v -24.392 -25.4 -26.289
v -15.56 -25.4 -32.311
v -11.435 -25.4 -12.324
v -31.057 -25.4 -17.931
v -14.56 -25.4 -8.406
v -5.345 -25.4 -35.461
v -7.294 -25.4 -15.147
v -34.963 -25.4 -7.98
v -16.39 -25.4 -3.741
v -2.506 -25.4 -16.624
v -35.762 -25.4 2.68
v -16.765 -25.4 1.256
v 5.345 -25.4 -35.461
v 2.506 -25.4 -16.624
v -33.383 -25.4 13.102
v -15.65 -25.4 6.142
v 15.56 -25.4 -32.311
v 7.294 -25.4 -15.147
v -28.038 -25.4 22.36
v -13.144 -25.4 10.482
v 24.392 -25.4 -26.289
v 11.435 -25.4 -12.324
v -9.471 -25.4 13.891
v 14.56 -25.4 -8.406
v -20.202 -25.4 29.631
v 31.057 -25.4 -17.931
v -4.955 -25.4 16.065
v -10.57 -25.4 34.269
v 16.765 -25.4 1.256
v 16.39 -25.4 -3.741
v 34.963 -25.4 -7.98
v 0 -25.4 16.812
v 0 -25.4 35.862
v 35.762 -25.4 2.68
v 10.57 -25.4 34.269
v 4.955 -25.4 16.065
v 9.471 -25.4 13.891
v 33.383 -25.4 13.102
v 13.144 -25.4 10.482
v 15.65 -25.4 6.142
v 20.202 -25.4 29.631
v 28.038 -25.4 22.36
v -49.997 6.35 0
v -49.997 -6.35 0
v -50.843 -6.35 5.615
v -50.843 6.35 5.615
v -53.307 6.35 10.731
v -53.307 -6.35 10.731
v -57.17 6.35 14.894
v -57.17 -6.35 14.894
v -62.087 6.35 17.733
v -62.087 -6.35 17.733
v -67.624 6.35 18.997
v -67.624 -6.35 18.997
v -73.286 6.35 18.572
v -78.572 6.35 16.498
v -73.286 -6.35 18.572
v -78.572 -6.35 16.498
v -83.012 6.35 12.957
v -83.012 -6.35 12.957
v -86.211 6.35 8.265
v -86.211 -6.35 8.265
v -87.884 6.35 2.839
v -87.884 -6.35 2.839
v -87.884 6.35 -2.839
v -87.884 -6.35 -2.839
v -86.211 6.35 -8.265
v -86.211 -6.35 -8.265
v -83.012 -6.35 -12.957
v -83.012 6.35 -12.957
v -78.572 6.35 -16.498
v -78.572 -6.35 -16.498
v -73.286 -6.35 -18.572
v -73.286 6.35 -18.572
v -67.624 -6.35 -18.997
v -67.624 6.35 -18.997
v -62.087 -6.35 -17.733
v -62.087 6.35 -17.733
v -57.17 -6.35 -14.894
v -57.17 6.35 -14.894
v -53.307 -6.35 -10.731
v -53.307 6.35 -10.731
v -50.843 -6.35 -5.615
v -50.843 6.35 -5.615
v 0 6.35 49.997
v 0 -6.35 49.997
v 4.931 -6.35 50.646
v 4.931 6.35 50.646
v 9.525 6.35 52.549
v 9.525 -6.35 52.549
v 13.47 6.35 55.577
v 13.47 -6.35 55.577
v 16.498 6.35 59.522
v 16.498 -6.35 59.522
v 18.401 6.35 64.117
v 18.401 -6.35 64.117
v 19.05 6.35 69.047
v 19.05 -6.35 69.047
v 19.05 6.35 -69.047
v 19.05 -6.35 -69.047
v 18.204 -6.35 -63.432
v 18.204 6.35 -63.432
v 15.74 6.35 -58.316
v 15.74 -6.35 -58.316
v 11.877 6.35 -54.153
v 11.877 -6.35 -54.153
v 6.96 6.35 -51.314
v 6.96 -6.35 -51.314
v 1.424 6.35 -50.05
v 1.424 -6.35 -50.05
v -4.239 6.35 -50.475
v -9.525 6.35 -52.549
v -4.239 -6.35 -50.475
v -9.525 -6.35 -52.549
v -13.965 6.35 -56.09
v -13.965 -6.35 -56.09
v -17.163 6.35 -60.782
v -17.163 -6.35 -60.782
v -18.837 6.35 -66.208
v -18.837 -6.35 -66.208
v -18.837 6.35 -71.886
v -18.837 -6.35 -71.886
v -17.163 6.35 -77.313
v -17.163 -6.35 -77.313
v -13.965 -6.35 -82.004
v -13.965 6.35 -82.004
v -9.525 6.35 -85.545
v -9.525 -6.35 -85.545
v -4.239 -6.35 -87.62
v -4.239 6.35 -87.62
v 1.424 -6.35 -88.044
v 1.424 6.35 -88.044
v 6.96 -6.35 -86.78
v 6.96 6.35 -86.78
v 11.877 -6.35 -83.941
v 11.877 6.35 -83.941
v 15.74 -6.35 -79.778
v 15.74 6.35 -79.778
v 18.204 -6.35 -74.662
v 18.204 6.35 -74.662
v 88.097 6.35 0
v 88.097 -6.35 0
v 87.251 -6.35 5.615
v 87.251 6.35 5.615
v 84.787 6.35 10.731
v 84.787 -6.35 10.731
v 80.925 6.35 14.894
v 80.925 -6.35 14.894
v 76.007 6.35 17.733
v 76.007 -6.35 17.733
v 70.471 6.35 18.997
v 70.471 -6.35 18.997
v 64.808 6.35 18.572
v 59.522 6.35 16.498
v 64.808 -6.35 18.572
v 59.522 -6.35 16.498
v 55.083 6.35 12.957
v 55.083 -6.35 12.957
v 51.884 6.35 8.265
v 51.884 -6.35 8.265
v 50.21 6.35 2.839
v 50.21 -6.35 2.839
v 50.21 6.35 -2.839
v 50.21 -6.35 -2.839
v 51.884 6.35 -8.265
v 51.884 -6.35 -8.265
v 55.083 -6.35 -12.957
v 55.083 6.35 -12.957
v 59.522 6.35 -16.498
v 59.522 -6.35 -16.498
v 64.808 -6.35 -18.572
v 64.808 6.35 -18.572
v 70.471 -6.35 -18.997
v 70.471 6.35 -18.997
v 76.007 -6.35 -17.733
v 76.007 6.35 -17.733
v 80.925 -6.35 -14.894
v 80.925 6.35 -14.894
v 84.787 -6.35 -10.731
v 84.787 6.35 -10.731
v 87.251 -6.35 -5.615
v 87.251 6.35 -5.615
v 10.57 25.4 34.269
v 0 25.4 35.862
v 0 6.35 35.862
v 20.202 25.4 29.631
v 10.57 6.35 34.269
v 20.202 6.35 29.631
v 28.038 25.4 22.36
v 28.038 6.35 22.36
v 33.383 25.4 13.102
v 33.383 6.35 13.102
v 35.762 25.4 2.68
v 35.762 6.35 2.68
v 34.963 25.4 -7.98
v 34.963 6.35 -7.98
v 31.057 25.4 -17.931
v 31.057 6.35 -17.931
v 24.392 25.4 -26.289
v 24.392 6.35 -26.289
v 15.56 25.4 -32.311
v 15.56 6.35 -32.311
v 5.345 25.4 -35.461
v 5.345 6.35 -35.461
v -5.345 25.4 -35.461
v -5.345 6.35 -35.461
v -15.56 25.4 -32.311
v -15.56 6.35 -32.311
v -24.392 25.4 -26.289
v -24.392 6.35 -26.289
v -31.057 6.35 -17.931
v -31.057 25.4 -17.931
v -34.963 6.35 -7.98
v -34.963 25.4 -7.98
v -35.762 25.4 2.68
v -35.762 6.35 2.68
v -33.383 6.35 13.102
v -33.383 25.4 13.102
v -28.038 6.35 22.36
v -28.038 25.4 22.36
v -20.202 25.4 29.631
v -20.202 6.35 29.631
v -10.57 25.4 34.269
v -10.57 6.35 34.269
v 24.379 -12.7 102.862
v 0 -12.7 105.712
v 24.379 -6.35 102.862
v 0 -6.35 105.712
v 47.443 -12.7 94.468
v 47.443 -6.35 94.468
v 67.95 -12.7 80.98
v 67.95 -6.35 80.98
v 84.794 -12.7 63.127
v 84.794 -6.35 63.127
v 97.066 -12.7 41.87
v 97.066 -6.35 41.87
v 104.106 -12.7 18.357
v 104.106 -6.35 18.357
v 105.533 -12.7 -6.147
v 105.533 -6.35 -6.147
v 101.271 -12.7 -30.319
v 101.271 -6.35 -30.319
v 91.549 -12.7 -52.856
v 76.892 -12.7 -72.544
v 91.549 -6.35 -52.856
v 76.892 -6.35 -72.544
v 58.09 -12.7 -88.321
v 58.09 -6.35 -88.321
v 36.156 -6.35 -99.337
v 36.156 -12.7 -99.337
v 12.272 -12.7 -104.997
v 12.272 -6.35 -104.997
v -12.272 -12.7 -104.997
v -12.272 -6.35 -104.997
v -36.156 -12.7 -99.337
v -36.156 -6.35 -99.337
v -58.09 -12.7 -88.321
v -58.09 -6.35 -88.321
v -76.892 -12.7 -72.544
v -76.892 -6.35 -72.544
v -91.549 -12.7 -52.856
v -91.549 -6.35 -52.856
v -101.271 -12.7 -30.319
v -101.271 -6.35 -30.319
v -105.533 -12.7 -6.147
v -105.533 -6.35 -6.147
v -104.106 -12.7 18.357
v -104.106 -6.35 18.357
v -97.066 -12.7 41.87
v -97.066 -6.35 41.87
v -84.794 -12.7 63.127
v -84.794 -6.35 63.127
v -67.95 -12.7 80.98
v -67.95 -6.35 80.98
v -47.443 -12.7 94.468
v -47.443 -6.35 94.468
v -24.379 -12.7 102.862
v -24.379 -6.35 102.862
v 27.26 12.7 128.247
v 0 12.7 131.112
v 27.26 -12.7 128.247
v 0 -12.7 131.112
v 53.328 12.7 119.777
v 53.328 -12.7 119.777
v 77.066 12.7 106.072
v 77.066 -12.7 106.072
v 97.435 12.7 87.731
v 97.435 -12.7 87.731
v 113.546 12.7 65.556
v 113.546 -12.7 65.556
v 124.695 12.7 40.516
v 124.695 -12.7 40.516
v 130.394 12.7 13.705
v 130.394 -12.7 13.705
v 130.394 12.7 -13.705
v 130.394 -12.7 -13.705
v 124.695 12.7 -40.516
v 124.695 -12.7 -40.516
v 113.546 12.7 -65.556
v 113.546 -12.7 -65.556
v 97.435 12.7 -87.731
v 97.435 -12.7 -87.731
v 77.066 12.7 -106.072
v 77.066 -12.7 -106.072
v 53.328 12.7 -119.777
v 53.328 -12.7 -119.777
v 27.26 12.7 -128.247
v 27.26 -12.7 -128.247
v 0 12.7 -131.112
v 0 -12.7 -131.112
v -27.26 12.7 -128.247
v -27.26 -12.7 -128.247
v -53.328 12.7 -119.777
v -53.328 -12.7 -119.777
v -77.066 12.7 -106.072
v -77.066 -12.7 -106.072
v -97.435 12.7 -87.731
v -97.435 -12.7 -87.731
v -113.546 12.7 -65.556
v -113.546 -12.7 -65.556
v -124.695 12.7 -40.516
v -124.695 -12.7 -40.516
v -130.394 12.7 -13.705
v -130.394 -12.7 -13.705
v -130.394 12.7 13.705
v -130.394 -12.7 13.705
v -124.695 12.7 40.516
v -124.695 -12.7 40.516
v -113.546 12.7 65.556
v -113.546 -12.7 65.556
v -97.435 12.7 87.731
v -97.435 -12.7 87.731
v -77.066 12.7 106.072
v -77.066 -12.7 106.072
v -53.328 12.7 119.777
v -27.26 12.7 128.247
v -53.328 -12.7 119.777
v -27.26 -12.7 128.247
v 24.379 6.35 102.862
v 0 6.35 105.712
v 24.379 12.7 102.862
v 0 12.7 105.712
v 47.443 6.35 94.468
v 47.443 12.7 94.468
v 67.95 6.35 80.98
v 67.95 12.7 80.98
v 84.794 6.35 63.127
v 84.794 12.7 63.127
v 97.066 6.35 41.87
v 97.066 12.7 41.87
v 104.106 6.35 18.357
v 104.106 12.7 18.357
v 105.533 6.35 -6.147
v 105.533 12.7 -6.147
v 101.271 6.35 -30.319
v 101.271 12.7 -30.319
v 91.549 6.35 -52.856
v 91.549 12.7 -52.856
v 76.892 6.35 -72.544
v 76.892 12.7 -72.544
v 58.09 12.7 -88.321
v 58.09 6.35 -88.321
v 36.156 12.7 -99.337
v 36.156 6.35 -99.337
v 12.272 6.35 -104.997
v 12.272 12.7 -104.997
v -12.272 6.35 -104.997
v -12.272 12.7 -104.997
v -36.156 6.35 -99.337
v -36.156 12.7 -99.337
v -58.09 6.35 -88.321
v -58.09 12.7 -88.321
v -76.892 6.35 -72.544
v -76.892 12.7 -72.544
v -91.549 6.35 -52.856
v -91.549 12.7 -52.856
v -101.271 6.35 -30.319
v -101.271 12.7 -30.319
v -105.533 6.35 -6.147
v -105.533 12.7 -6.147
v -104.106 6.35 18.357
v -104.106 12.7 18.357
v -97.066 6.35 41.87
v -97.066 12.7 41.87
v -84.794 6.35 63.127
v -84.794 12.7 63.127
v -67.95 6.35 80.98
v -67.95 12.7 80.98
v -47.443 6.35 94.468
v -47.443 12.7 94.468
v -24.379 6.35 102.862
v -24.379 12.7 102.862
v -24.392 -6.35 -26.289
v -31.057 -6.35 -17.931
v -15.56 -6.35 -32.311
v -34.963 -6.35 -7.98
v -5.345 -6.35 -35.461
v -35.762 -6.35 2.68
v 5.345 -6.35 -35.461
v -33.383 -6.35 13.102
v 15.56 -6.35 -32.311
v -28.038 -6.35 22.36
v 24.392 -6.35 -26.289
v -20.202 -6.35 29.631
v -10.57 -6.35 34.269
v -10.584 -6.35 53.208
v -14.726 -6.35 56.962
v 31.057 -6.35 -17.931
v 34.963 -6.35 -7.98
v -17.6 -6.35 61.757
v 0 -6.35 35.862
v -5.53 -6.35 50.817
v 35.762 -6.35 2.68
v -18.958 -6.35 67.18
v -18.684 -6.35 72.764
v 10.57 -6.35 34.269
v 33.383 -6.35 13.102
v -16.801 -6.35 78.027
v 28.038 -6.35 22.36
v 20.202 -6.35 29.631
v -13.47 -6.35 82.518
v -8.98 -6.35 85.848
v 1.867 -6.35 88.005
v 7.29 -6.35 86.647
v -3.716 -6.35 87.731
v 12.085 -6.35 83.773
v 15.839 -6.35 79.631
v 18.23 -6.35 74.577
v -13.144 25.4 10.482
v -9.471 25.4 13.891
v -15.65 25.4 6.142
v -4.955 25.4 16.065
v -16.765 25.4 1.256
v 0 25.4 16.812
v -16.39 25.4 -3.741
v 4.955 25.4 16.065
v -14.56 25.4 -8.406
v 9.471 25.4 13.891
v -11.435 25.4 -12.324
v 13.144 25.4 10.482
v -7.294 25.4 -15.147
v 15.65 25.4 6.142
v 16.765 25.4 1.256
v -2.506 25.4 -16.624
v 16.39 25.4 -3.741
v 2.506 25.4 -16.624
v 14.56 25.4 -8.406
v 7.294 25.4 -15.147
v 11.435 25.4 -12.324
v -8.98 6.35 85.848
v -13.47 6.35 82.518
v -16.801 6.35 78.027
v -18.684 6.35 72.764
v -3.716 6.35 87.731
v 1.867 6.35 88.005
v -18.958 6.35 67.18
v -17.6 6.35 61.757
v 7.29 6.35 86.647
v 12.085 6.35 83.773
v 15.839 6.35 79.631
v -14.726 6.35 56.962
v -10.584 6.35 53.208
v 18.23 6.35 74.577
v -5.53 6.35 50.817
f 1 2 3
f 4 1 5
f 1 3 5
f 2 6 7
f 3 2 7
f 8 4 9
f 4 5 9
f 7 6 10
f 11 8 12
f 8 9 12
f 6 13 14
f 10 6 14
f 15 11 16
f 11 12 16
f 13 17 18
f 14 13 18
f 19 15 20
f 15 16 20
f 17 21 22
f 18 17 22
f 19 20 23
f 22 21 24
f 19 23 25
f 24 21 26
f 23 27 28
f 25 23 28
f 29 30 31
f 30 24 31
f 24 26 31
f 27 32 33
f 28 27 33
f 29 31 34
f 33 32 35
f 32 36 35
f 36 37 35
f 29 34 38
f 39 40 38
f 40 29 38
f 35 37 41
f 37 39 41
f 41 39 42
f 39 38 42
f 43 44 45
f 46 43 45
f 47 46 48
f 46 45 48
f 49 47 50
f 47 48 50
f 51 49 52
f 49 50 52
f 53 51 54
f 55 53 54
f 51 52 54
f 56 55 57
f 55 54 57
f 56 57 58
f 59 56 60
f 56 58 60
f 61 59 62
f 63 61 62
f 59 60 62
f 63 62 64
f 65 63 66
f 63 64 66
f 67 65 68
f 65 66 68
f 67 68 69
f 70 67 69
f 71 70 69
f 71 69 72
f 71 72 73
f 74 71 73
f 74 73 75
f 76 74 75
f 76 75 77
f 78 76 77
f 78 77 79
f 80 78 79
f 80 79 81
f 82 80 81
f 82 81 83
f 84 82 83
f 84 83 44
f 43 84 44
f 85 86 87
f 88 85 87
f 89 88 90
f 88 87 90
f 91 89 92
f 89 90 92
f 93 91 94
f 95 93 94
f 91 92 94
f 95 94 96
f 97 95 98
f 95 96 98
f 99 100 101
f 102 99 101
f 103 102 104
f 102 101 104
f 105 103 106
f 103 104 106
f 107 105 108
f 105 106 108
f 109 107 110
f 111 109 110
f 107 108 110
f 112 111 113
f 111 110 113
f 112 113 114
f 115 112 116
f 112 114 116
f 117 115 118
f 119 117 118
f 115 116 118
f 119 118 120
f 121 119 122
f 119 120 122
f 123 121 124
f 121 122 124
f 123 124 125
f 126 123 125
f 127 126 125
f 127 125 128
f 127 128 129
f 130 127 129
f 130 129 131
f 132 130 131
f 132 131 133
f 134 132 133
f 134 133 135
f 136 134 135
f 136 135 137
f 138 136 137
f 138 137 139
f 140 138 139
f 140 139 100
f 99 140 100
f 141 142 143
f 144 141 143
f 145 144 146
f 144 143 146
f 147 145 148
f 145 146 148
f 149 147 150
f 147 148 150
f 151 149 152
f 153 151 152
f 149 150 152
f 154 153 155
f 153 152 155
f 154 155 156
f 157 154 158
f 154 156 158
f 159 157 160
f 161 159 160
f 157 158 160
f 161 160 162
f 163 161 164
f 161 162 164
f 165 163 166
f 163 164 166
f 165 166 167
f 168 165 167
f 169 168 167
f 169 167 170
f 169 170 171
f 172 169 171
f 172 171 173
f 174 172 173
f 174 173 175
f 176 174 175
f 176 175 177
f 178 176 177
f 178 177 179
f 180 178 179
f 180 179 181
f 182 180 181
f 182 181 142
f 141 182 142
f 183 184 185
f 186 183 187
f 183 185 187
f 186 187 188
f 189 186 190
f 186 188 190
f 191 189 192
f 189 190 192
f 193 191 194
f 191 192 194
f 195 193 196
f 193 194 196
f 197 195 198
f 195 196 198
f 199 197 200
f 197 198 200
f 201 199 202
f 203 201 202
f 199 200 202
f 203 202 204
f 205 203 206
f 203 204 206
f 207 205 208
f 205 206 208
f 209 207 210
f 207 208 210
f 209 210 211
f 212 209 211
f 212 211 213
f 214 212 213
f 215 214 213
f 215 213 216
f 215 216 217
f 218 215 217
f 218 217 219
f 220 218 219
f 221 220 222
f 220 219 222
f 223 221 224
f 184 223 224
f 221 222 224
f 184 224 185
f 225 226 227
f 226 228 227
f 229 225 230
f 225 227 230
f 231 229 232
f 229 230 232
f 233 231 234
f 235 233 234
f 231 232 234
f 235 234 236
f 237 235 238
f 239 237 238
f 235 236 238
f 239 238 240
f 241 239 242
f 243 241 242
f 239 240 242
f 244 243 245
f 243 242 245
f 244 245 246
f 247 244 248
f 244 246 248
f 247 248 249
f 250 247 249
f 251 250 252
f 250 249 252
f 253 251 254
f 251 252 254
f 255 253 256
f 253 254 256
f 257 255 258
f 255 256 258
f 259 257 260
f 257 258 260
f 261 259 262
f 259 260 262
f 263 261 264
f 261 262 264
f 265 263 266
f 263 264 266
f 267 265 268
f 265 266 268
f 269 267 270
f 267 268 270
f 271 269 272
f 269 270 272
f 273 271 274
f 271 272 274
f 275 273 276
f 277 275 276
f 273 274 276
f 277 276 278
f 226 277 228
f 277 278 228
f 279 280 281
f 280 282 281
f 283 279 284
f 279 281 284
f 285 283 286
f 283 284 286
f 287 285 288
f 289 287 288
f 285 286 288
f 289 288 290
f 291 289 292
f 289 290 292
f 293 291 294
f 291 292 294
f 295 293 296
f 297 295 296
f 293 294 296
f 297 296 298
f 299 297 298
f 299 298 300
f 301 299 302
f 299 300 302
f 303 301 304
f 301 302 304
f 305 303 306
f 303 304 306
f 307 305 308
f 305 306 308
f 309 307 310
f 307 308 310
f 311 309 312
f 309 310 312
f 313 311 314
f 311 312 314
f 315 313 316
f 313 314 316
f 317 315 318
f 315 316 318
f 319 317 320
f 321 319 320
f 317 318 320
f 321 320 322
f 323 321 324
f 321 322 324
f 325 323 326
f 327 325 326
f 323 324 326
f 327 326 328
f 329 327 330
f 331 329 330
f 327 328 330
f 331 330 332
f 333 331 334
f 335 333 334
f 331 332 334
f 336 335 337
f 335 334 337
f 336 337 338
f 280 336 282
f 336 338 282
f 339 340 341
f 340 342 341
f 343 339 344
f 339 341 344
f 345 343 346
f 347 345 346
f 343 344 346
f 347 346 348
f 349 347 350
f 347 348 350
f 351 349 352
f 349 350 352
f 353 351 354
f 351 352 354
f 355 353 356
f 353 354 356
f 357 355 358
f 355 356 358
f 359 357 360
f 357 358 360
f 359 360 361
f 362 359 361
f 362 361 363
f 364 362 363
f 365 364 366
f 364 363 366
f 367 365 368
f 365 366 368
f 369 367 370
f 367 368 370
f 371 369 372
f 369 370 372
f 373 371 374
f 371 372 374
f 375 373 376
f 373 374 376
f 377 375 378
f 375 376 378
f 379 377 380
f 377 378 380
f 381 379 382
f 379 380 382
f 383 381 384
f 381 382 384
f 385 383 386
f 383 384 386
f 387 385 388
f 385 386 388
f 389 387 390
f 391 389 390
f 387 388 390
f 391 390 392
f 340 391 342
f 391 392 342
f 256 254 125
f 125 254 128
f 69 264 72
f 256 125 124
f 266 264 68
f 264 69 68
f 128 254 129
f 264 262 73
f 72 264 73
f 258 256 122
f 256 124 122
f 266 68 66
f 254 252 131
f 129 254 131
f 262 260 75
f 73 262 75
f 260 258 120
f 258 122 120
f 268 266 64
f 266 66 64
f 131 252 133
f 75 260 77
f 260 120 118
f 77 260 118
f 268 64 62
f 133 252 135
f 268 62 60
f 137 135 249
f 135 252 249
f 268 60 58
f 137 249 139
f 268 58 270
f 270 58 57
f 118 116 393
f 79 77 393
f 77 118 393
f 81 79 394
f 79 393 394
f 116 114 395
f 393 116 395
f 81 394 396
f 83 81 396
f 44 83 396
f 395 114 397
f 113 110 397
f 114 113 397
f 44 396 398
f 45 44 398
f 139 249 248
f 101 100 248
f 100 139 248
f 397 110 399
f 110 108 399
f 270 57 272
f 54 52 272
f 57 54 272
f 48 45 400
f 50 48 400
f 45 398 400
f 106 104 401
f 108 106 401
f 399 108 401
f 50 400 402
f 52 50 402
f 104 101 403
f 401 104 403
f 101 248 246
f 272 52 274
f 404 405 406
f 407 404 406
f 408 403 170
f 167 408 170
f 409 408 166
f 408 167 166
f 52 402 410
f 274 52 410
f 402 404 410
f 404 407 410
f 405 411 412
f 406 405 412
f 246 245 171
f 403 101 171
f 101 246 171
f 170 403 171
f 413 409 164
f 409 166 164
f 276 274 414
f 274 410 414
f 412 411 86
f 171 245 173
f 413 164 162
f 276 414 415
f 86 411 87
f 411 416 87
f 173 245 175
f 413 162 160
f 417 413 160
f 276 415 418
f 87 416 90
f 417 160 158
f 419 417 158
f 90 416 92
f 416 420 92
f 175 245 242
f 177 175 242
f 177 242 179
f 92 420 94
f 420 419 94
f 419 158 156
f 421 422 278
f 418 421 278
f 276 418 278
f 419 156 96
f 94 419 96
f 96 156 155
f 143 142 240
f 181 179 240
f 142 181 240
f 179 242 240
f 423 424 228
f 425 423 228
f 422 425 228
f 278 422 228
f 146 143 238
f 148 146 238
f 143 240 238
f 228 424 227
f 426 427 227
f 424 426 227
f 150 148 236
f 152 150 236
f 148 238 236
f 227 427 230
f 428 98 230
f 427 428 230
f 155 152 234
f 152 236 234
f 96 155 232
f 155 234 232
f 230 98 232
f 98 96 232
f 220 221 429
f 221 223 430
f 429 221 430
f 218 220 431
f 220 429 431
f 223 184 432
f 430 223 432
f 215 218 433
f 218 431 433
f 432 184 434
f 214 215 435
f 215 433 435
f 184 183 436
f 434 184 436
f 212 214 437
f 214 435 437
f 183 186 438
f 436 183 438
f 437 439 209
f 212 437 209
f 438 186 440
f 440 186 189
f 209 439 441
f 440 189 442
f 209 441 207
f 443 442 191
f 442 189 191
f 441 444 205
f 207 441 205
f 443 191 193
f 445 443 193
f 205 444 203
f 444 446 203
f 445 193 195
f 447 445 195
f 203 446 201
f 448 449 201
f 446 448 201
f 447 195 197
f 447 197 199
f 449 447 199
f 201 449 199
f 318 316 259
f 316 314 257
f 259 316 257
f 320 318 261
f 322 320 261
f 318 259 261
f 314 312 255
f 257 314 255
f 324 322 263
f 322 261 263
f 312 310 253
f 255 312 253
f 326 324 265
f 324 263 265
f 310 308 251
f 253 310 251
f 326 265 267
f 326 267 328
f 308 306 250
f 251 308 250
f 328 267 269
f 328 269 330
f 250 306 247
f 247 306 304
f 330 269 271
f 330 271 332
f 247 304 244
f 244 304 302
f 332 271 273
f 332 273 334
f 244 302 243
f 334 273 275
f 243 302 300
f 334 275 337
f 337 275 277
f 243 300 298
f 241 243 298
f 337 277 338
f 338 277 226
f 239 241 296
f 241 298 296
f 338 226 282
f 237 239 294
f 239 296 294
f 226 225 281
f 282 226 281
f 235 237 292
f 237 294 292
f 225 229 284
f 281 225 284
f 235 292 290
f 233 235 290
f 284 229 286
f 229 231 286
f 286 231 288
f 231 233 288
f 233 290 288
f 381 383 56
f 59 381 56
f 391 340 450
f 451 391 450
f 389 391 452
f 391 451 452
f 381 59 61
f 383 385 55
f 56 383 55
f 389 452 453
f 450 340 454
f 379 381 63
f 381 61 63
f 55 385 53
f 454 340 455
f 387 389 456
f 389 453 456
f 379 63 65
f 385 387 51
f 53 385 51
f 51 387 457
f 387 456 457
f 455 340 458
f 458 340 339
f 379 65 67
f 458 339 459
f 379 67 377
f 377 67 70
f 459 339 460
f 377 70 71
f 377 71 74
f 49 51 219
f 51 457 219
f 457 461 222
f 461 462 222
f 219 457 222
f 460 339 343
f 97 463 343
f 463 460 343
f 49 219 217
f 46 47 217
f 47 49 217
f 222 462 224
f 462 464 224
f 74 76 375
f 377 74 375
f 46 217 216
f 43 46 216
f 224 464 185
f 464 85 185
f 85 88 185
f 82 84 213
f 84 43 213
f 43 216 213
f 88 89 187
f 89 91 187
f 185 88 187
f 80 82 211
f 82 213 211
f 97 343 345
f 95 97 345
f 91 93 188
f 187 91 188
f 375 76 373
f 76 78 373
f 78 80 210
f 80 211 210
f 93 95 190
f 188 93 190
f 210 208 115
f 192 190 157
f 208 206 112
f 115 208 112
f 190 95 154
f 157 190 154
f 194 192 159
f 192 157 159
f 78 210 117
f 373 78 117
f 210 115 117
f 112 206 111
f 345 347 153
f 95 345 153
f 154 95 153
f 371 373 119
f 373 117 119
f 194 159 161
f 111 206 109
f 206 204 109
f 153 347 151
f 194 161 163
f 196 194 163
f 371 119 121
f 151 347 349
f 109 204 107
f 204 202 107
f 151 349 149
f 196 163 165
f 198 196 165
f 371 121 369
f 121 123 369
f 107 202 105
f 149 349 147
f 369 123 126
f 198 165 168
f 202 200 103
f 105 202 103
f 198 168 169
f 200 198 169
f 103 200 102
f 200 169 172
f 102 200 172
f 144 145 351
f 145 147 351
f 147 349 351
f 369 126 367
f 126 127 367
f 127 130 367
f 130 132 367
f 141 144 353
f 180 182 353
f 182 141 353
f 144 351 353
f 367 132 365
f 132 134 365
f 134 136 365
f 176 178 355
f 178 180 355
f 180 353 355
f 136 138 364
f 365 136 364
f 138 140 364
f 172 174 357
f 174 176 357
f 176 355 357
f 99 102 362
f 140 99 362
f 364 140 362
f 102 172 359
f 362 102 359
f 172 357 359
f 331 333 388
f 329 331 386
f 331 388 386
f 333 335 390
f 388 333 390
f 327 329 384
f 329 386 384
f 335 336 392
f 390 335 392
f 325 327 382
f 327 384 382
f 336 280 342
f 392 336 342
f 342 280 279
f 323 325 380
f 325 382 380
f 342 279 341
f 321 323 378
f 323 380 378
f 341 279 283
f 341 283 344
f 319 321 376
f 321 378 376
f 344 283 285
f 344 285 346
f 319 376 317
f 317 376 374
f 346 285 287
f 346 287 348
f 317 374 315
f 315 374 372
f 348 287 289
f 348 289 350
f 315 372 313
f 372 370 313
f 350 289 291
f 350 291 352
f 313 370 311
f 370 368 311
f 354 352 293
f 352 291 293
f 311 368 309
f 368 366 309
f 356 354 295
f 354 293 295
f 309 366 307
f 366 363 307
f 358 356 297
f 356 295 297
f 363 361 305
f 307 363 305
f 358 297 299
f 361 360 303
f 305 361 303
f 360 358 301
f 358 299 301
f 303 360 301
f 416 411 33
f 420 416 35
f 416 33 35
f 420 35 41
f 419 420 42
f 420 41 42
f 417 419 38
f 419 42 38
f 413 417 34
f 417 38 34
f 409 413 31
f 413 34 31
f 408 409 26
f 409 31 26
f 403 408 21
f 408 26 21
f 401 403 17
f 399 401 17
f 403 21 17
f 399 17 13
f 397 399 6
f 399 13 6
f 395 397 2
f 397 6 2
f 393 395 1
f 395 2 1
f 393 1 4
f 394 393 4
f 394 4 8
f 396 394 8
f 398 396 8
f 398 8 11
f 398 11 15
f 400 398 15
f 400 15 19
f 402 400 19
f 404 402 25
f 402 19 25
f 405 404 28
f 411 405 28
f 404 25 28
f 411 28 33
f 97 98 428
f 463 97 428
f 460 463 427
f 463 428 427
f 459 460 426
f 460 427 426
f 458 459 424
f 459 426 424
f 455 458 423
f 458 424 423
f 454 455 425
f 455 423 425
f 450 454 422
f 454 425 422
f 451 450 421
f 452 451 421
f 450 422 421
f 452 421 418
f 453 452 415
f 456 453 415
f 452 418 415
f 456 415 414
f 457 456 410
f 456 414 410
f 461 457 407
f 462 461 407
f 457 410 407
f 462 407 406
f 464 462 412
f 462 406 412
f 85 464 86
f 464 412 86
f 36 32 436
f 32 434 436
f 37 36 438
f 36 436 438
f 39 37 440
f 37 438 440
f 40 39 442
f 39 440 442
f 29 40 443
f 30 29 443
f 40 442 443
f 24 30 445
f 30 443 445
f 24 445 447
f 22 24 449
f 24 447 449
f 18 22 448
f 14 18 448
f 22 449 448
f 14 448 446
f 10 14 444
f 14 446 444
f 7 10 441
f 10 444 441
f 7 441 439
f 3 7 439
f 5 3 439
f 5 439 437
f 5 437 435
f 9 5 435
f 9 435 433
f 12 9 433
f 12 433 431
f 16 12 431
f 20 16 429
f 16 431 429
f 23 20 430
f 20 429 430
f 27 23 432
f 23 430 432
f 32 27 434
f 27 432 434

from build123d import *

# Parameters (mm, degrees)
F2_R     = 19.05
F3_DEPTH = 25.4


with BuildPart() as f1:
    # F0 (on Right) → F1 (revolve)
    with BuildSketch(Plane.YZ):
        Polygon((-25.4, 16.811958), (0, 16.811958), (0, 26.336958), (0, 28.782088), (-6.35, 28.782088), (-6.35, 35.861958), (-25.4, 35.861958), align=None)
        Polygon((0, 26.336958), (0, 16.811958), (25.4, 16.811958), (25.4, 35.861958), (6.35, 35.861958), (6.35, 105.711958), (12.7, 105.711958), (12.7, 131.111958), (-12.7, 131.111958), (-12.7, 105.711958), (-6.35, 105.711958), (-6.35, 35.861958), (-6.35, 28.782088), (0, 28.782088), align=None)
    revolve(axis=Axis((0, 18.4531, 0), (0, 1, 0)))

    # F2 (on face) → F3 (cut)
    with BuildSketch(Plane.XZ.offset(6.35)):
        with BuildLine():
            ThreePointArc((19.05, 69.047159), (-13.470384, 82.517543), (0, 49.997159))
            ThreePointArc((0, 49.997159), (13.470384, 55.576775), (19.05, 69.047159))
        make_face()
        with Locations((69.047159, 0)):
            Circle(F2_R)
        with Locations((0, -69.047159)):
            Circle(F2_R)
        with Locations((-69.047159, 0)):
            Circle(F2_R)
    extrude(amount=-F3_DEPTH, mode=Mode.SUBTRACT)


solid = f1.part
